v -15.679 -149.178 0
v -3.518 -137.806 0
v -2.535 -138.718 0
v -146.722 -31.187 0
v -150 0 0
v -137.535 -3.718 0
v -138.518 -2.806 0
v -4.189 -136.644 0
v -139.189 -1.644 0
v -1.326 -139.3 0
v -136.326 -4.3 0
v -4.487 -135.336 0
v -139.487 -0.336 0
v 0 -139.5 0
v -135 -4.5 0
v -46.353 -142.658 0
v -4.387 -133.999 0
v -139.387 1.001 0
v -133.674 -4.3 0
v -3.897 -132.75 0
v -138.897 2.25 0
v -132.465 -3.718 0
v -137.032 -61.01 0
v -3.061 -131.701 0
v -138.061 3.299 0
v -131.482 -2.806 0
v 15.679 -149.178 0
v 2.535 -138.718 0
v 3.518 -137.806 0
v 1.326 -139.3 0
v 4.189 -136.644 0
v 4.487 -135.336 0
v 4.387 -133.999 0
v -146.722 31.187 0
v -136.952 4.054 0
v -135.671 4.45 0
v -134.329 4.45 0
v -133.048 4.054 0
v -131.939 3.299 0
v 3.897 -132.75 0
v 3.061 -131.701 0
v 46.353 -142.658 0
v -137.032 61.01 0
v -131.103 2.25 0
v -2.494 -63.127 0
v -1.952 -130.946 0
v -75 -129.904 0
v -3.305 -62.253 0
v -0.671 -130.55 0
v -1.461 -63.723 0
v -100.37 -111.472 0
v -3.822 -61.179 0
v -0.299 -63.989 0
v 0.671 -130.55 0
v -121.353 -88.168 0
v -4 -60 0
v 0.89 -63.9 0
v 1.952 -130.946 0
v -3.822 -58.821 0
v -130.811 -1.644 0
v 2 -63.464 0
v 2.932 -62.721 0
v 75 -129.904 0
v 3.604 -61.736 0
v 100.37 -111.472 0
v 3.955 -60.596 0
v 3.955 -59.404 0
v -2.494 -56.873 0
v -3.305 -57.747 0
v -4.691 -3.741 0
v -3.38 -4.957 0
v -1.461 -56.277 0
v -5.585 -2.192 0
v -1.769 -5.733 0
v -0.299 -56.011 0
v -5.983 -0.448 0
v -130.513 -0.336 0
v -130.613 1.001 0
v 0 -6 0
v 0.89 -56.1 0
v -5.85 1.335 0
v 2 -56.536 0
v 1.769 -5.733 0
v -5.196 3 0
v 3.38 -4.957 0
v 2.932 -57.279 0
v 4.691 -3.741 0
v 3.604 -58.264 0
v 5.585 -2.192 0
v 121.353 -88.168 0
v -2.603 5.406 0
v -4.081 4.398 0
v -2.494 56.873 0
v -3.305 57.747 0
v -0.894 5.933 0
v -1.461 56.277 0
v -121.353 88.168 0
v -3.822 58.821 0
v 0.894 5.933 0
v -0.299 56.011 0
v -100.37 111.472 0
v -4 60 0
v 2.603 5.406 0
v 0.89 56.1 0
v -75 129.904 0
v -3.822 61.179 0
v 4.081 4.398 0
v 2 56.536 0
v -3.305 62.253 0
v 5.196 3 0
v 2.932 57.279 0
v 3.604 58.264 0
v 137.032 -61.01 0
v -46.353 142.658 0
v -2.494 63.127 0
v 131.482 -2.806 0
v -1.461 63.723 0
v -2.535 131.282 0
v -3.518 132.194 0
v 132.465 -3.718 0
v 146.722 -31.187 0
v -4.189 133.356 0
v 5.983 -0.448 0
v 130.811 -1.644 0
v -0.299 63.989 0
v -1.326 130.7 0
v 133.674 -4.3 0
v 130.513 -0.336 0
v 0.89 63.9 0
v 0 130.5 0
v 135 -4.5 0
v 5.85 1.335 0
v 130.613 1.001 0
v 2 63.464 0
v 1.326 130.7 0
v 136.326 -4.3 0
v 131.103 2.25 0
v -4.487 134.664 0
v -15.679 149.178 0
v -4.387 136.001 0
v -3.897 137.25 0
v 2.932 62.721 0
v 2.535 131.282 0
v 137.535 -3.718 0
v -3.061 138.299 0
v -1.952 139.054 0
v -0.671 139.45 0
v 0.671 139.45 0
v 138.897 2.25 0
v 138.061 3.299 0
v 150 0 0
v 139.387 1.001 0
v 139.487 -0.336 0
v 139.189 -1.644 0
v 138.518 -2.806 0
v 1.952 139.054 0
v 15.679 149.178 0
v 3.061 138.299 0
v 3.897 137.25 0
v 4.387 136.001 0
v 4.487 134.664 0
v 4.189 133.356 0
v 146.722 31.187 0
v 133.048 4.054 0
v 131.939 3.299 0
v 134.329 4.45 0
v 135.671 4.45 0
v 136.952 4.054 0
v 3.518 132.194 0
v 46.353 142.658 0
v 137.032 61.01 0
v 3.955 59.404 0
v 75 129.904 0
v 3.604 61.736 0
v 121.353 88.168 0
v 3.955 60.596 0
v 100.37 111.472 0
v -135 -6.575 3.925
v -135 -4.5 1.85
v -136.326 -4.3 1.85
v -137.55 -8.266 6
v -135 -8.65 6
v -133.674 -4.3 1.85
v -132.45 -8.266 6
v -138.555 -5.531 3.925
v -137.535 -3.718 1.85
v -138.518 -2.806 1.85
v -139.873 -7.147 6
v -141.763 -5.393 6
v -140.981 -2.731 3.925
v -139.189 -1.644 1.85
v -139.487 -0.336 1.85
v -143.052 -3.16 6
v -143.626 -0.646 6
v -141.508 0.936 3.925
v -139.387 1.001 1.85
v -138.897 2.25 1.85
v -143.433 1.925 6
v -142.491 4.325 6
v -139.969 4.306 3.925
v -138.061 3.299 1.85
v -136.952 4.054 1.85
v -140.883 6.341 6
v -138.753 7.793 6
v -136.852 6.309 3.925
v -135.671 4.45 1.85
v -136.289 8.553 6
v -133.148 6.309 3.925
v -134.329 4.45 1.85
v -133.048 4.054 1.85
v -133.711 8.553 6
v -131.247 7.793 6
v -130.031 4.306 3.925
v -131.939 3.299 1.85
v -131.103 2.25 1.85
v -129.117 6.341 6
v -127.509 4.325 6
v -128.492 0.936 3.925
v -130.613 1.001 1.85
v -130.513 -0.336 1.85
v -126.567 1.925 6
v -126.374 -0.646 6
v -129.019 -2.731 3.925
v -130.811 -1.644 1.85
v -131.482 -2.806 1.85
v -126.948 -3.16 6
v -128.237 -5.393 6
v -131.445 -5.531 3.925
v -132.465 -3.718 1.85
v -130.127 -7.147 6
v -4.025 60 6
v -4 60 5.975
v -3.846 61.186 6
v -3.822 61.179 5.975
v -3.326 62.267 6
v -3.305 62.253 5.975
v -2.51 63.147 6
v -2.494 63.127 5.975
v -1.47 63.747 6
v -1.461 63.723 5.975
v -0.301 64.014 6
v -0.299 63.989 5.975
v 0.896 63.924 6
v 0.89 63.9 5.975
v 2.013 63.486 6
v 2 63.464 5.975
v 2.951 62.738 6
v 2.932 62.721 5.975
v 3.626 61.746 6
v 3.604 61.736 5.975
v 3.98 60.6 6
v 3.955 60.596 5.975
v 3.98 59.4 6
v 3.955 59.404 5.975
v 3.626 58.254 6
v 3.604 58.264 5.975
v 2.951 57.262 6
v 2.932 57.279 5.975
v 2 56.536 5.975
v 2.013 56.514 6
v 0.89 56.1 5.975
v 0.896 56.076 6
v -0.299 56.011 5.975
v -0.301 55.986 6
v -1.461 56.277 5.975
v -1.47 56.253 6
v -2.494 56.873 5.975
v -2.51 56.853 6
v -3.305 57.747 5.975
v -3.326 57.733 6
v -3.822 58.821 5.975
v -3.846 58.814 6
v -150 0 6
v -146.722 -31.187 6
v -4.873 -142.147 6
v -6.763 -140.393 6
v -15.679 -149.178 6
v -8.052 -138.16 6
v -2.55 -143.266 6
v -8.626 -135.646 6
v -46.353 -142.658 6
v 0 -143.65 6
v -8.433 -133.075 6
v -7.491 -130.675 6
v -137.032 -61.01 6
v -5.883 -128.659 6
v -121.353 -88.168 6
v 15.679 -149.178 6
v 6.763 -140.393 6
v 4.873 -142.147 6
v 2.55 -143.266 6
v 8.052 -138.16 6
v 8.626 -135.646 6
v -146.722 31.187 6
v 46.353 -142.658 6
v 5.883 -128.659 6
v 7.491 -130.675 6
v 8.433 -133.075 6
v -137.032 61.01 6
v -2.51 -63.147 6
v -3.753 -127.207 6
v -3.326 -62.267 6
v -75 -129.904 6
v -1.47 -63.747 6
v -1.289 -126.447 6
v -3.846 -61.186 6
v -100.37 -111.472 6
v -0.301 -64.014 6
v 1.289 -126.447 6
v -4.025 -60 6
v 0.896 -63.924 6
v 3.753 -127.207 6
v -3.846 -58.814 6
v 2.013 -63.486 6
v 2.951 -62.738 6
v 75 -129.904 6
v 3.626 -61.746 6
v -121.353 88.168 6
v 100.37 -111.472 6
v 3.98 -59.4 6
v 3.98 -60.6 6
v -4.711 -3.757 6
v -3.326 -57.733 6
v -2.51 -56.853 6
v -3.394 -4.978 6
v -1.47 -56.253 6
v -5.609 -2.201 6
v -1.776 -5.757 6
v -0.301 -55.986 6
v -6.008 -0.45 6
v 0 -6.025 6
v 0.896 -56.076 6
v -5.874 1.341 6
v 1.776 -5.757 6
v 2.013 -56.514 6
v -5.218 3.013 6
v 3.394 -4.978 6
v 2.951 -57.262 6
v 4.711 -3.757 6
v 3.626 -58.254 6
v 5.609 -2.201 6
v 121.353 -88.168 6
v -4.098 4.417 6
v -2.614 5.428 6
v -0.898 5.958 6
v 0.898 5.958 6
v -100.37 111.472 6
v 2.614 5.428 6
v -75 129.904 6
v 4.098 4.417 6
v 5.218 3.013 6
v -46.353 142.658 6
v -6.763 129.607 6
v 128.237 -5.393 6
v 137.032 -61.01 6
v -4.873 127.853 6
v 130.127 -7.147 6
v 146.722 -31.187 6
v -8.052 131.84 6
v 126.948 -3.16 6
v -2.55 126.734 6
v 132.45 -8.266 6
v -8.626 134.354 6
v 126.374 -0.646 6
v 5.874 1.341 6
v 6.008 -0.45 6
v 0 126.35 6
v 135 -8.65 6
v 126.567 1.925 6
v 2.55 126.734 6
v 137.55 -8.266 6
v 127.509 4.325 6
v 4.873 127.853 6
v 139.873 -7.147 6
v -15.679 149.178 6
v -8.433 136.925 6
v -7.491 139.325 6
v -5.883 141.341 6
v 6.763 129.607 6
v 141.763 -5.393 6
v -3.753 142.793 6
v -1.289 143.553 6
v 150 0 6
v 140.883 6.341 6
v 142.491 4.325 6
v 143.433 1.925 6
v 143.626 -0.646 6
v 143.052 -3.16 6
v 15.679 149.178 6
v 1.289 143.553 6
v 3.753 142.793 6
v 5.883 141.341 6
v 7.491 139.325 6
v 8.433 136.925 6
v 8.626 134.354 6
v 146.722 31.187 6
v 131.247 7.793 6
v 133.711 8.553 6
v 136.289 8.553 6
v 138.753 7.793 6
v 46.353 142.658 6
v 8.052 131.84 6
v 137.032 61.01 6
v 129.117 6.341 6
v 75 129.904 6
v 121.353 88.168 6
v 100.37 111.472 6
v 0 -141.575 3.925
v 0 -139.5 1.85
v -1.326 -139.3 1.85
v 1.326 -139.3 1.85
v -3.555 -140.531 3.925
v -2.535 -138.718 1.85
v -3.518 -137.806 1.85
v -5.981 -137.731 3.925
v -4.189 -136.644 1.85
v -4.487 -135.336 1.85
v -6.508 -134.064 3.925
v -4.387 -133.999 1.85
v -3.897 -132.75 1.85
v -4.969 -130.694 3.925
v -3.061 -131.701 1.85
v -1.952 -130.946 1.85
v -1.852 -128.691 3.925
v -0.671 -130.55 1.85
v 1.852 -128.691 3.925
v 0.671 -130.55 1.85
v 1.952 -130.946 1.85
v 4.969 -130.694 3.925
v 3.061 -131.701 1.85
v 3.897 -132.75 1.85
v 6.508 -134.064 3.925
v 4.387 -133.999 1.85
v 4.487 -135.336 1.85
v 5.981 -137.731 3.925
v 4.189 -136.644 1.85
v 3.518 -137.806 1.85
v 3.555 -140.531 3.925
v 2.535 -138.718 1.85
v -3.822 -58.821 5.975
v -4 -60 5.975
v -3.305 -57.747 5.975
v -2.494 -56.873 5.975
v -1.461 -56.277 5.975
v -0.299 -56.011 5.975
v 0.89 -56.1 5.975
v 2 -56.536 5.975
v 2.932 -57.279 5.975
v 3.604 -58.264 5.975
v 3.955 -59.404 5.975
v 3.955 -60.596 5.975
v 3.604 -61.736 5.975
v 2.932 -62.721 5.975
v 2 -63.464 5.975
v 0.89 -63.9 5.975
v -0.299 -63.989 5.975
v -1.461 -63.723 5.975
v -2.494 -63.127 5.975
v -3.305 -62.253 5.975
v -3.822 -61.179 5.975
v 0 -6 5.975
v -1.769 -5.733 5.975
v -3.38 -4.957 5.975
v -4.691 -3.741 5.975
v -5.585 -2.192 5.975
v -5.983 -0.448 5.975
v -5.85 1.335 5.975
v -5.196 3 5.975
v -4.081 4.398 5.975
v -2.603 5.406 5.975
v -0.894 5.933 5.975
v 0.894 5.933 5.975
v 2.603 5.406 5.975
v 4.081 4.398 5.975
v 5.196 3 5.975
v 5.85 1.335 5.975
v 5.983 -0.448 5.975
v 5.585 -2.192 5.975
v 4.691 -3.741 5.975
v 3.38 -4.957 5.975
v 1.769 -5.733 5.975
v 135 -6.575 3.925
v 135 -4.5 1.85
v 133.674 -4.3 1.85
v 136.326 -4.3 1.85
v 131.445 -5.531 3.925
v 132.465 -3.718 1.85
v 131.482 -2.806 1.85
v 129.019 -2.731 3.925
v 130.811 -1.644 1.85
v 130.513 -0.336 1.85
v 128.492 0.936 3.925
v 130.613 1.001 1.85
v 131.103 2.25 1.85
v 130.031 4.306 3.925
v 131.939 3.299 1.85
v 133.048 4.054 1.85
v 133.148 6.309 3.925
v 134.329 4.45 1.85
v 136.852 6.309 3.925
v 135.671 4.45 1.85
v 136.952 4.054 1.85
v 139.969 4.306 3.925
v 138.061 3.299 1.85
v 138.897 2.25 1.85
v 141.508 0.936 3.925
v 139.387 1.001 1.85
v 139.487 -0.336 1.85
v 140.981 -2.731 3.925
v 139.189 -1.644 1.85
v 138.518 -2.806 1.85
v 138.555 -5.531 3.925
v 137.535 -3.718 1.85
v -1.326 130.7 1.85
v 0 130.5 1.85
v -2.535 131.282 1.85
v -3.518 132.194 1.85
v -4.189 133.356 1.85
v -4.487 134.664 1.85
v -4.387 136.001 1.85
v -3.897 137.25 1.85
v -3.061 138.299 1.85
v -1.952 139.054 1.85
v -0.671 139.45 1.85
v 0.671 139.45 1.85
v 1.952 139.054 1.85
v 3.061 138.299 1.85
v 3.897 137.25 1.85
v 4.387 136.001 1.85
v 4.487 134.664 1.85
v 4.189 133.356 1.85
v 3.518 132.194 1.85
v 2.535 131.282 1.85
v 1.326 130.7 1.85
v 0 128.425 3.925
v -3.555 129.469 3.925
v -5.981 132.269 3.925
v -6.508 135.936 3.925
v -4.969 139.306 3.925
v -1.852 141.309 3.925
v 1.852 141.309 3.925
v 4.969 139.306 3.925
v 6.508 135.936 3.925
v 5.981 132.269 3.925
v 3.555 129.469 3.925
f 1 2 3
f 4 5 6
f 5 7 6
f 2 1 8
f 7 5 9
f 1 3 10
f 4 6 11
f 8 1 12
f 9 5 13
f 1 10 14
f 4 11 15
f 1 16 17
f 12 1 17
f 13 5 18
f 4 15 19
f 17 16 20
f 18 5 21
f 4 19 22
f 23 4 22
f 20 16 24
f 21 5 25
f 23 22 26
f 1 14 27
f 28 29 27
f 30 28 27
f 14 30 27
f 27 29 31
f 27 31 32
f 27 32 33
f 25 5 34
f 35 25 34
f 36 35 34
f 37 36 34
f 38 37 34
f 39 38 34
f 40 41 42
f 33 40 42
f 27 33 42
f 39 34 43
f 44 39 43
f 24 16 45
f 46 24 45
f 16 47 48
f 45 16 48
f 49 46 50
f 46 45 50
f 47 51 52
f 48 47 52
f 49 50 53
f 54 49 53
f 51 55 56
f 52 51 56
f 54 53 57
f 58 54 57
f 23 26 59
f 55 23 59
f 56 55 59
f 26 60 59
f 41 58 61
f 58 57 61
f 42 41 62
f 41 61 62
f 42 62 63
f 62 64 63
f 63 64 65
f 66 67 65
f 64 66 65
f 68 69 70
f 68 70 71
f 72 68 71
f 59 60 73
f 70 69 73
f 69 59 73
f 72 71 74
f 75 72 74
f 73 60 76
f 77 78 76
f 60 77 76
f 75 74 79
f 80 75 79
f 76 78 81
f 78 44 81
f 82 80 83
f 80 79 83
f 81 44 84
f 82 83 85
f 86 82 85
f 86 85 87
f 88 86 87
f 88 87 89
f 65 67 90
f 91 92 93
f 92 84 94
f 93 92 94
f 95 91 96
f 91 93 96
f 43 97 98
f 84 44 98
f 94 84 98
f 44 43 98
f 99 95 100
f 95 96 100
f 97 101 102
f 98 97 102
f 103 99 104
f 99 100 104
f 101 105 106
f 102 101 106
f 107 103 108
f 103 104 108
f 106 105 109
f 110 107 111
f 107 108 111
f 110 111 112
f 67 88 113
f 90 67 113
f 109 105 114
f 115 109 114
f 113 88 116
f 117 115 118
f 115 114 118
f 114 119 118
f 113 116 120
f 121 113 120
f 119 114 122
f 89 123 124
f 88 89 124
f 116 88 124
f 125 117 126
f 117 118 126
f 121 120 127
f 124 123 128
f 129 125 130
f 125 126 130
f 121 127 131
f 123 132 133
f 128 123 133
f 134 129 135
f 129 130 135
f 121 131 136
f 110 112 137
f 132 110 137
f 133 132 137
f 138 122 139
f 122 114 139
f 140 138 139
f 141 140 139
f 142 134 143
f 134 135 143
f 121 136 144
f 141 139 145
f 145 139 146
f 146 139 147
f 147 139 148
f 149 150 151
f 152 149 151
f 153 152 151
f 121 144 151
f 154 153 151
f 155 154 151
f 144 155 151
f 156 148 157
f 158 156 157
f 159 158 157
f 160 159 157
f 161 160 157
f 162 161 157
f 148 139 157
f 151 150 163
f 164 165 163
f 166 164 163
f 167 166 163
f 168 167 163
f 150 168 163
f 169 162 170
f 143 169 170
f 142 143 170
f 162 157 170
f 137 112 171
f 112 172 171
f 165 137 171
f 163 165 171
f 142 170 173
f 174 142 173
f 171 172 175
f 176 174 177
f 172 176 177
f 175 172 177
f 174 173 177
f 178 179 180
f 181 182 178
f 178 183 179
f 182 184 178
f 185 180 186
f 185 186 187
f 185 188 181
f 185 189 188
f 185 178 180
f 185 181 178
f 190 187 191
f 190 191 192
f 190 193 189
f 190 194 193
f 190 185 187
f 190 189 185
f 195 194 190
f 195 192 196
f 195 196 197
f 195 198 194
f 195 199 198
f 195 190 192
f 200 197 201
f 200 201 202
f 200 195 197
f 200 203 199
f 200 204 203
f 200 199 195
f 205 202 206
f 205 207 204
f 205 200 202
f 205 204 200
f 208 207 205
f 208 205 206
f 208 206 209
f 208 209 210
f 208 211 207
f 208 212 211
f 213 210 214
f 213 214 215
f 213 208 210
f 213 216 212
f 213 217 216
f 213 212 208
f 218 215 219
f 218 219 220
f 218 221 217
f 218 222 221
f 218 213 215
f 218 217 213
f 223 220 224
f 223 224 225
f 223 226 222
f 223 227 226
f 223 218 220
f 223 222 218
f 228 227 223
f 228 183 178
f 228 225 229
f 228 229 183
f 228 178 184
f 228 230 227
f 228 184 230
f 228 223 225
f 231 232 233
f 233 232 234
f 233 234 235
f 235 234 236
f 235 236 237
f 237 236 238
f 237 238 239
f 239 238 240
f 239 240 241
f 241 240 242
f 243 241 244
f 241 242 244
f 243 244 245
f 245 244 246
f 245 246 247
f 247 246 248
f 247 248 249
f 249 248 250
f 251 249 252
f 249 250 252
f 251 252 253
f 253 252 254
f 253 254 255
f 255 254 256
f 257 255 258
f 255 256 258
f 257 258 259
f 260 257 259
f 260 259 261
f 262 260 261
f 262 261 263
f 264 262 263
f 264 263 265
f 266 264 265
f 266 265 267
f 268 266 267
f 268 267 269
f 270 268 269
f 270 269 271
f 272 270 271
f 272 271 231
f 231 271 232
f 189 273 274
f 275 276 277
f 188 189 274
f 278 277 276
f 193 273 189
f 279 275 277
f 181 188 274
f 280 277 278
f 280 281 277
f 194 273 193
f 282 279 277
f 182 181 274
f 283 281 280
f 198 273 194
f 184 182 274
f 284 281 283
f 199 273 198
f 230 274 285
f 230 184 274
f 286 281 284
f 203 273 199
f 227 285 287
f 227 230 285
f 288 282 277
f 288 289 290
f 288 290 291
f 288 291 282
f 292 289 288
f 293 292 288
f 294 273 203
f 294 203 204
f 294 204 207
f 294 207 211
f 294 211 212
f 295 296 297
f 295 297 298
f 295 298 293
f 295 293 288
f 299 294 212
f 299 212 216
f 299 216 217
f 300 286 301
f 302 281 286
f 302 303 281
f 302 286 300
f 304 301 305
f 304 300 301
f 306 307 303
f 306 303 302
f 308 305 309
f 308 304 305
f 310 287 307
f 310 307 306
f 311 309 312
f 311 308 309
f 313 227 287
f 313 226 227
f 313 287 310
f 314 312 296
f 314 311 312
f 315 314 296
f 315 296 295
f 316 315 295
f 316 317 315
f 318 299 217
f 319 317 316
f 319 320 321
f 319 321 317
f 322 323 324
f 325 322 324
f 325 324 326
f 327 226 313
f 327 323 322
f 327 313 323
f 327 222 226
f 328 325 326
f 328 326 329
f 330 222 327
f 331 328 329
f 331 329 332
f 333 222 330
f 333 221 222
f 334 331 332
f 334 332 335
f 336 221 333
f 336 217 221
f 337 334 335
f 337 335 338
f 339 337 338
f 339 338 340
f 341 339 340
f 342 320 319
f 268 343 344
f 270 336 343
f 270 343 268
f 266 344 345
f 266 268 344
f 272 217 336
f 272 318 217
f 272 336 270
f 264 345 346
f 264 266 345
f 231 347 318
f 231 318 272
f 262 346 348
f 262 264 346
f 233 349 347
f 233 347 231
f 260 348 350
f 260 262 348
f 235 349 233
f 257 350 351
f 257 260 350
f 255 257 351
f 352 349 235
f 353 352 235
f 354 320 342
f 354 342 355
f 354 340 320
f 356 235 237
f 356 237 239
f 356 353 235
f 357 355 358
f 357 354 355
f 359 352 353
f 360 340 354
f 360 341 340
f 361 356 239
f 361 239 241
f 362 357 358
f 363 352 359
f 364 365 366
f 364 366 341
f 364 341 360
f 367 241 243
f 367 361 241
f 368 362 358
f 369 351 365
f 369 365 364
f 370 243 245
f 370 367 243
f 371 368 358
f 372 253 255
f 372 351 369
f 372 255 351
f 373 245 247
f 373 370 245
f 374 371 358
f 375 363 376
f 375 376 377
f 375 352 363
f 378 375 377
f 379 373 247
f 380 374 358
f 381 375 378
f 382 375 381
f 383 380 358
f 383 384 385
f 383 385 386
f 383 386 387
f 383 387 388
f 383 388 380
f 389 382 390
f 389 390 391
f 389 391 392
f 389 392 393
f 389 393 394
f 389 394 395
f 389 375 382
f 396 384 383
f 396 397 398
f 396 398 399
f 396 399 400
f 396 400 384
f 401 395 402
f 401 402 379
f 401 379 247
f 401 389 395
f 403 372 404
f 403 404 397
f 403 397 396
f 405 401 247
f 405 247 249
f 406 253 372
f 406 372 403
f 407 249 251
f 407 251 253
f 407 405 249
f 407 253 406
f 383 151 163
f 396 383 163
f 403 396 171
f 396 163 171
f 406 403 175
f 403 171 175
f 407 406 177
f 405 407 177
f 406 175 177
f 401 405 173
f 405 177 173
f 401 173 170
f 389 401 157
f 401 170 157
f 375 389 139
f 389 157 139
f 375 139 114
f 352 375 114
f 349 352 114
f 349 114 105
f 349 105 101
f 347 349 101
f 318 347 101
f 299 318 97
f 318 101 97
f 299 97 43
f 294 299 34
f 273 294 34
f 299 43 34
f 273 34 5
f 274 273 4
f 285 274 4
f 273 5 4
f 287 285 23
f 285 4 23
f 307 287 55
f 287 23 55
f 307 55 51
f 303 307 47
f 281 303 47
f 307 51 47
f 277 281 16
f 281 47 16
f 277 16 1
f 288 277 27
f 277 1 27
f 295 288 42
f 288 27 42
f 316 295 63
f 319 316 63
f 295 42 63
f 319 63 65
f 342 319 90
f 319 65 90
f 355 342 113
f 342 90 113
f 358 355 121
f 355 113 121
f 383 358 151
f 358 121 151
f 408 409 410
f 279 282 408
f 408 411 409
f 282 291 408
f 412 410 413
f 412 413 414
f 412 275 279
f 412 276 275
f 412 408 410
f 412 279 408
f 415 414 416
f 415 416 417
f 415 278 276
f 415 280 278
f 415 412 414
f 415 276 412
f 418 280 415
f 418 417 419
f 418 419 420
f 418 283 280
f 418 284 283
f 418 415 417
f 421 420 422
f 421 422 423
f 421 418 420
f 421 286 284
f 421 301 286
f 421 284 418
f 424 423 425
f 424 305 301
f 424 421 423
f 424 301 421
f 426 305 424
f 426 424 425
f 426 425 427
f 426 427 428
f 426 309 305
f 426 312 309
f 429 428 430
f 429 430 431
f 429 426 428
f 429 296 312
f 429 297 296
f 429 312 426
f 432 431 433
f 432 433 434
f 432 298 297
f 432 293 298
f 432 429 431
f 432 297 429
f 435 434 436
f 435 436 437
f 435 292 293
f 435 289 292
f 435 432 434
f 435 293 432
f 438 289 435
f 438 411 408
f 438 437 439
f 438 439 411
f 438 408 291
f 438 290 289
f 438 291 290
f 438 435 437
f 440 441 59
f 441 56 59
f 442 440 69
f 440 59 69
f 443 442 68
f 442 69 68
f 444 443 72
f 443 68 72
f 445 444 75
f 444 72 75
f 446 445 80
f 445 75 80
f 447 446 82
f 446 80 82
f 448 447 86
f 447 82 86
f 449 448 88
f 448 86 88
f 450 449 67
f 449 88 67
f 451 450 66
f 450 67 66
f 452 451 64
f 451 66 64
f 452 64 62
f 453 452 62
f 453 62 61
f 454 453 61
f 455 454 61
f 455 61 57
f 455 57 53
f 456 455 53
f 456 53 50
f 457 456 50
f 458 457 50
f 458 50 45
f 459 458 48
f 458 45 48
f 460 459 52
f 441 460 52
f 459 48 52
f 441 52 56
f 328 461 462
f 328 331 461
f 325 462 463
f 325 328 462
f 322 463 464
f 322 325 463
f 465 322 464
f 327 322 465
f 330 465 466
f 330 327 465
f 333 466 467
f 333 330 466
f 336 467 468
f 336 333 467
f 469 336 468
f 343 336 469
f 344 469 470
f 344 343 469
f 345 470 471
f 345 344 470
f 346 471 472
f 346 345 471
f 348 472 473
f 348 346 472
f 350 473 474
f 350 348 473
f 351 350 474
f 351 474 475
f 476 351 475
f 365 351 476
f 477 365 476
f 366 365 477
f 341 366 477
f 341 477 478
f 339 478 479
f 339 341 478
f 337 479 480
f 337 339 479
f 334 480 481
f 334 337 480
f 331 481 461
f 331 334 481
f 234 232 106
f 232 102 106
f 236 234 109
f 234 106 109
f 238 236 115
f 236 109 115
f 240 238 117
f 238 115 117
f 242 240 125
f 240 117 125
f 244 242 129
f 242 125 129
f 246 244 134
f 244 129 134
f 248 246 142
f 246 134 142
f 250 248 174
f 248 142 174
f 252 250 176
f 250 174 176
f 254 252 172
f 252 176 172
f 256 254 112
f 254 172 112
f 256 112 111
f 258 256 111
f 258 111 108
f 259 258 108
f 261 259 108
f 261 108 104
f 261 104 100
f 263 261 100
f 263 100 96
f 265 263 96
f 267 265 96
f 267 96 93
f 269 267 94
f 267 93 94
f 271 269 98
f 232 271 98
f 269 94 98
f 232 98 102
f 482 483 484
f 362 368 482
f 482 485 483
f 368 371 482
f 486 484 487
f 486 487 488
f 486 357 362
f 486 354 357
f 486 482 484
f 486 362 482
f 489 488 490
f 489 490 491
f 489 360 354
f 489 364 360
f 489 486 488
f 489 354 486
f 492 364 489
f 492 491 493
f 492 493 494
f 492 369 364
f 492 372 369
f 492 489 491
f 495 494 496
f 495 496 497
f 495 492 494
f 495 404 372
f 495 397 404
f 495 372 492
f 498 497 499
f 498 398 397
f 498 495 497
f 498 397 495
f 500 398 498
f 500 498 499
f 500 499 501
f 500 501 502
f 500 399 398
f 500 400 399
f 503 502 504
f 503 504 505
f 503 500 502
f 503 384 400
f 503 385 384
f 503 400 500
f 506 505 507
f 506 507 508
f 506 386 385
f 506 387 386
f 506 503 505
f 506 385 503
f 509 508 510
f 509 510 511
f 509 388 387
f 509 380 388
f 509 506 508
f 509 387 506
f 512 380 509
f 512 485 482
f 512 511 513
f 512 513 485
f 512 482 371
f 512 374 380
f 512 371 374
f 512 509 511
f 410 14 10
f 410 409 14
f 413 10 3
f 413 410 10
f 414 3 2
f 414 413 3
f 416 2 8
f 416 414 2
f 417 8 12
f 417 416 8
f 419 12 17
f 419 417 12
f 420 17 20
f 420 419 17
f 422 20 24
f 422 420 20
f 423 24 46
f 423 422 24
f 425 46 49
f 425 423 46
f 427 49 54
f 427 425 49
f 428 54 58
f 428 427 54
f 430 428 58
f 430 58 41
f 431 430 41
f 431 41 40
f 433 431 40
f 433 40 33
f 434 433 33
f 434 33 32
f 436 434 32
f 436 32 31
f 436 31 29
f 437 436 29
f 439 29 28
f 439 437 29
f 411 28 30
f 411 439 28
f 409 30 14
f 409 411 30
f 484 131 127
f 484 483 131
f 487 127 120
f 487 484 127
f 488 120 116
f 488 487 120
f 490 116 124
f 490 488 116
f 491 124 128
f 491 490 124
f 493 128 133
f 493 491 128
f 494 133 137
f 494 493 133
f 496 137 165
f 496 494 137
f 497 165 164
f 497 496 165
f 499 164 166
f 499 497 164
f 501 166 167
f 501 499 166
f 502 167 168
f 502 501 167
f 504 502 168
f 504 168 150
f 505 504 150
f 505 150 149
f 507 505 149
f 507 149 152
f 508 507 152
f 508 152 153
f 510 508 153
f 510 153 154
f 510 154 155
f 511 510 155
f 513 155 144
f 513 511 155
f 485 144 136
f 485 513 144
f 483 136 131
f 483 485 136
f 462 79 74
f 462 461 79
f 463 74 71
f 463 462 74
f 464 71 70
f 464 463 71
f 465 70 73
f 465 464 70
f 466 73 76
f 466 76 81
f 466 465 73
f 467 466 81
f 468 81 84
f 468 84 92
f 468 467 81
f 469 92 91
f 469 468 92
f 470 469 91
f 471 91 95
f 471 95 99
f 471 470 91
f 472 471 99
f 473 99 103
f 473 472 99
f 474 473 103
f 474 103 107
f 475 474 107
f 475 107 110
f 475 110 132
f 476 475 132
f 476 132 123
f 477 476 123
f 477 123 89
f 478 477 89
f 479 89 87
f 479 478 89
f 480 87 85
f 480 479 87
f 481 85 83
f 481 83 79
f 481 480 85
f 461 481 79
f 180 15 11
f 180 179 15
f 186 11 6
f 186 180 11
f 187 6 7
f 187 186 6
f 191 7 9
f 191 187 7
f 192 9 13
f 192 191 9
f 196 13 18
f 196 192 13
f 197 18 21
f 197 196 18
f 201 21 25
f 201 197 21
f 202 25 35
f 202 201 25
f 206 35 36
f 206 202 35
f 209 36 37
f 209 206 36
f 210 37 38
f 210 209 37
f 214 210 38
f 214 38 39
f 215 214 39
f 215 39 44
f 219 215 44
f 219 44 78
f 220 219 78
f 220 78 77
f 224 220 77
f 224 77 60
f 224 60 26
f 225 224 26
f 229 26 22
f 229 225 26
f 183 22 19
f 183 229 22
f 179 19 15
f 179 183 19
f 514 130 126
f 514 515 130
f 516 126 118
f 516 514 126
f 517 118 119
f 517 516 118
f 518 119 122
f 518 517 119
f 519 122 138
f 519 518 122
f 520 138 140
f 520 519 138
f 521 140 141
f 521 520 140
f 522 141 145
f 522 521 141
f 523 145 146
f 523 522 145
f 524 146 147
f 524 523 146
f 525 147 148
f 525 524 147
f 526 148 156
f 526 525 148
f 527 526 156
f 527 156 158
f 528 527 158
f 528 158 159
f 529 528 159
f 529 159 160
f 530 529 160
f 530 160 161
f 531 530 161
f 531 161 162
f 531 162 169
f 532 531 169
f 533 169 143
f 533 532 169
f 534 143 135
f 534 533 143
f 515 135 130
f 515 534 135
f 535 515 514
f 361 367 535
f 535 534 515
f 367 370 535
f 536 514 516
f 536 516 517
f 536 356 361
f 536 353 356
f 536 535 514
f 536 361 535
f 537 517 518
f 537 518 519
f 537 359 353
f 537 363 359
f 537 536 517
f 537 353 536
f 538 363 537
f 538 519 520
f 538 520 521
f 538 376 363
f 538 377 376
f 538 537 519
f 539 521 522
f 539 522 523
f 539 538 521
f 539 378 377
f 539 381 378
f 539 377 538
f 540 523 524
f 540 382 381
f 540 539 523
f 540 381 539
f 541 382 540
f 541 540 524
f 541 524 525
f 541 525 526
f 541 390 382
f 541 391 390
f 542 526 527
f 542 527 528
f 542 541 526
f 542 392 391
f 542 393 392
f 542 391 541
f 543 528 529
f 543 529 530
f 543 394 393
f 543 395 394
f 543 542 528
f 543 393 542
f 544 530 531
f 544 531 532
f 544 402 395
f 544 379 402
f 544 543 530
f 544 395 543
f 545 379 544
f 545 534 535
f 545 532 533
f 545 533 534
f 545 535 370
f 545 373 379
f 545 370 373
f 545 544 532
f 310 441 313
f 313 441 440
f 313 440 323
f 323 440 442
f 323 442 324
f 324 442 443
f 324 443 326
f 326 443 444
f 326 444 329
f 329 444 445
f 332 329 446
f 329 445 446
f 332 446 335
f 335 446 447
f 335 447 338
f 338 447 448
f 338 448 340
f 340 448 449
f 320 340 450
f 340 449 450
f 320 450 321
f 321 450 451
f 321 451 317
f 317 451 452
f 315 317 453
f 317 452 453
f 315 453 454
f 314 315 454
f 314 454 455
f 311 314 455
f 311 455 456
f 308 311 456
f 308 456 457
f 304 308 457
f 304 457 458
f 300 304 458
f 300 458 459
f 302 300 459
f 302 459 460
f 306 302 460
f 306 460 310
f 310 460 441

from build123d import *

# Parameters (mm, degrees)
SZKIC1_R                                    = 150
DODANIE_WYCI_GNI_CIE1_DEPTH                 = 6
OTWORY_USTALAJ_CE_8_0MM1_D                  = 8
OTWORY_USTALAJ_CE_8_0MM1_CSINK_D            = 8.05
OTWORY_USTALAJ_CE_8_0MM1_CSINK_ANGLE        = 90
POG_BIENIE_STO_KOWE_POD_M8_WKR_T_DO_2_COUNT = 2
POG_BIENIE_STO_KOWE_POD_M8_WKR_T_DO_2_PITCH = 190.91883092
POG_BIENIE_STO_KOWE_POD_M8_WKR_T_DO_3_COUNT = 2
POG_BIENIE_STO_KOWE_POD_M8_WKR_T_DO_3_PITCH = 270
POG_BIENIE_STO_KOWE_POD_M8_WKR_T_DO_4_COUNT = 2
POG_BIENIE_STO_KOWE_POD_M8_WKR_T_DO_4_PITCH = 190.91883092


with BuildPart() as part:
    # Szkic1 → Dodanie-wyciągnięcie1 (new body)
    with BuildSketch(Plane.XY):
        Circle(SZKIC1_R)
    extrude(amount=DODANIE_WYCI_GNI_CIE1_DEPTH)

    # Otwory ustalające Ø8.0mm1 (through all)
    with Locations(Plane.XY.offset(6)):
        with Locations((0, 60), (0, -60)):
            CounterSinkHole(OTWORY_USTALAJ_CE_8_0MM1_D / 2, OTWORY_USTALAJ_CE_8_0MM1_CSINK_D / 2, counter_sink_angle=OTWORY_USTALAJ_CE_8_0MM1_CSINK_ANGLE)

    # Szkic6 → Otwory ustalające Ø12.0mm1 (revolve, cut)
    with BuildSketch(Plane(origin=(0, 0, 6), x_dir=(0, -1, 0), z_dir=(1, 0, 0))):
        Polygon((0, 0), (0, 6), (6, 6), (6, 0.025), (6.025, 0), align=None)
    revolve(axis=Axis((0, 0, 12.35), (0, 0, -1)), mode=Mode.SUBTRACT)

    # Szkic10 → Pogłębienie stożkowe pod M8 wkręt do części metalowych z łbem soczewkowym1 (revolve, cut)
    with BuildSketch(Plane(origin=(0, 135, 6), x_dir=(0, -1, 0), z_dir=(1, 0, 0))):
        Polygon((0, 0), (0, 6), (4.5, 6), (4.5, 4.15), (8.65, 0), align=None)
    pog_bienie_sto_kowe_pod_m8_wkr_t_do_cz_c = revolve(axis=Axis((0, 135, 12.35), (0, 0, -1)), mode=Mode.SUBTRACT)

    # Pog_bienie sto_kowe pod M8 wkr_t do  2: Pogłębienie stożkowe pod M8 wkręt do części metalowych z łbem soczewkowym1 ×2
    with Locations(*[Vector(0.7071067811865674, -0.7071067811865276, 0) * (i * POG_BIENIE_STO_KOWE_POD_M8_WKR_T_DO_2_PITCH) for i in range(1, POG_BIENIE_STO_KOWE_POD_M8_WKR_T_DO_2_COUNT)]):
        add(pog_bienie_sto_kowe_pod_m8_wkr_t_do_cz_c, mode=Mode.SUBTRACT)

    # Pog_bienie sto_kowe pod M8 wkr_t do  3: Pogłębienie stożkowe pod M8 wkręt do części metalowych z łbem soczewkowym1 ×2
    with Locations(*[(0, -i * POG_BIENIE_STO_KOWE_POD_M8_WKR_T_DO_3_PITCH, 0) for i in range(1, POG_BIENIE_STO_KOWE_POD_M8_WKR_T_DO_3_COUNT)]):
        add(pog_bienie_sto_kowe_pod_m8_wkr_t_do_cz_c, mode=Mode.SUBTRACT)

    # Pog_bienie sto_kowe pod M8 wkr_t do  4: Pogłębienie stożkowe pod M8 wkręt do części metalowych z łbem soczewkowym1 ×2
    with Locations(*[Vector(-0.7071067811865277, -0.7071067811865674, 0) * (i * POG_BIENIE_STO_KOWE_POD_M8_WKR_T_DO_4_PITCH) for i in range(1, POG_BIENIE_STO_KOWE_POD_M8_WKR_T_DO_4_COUNT)]):
        add(pog_bienie_sto_kowe_pod_m8_wkr_t_do_cz_c, mode=Mode.SUBTRACT)


solid = part.part
